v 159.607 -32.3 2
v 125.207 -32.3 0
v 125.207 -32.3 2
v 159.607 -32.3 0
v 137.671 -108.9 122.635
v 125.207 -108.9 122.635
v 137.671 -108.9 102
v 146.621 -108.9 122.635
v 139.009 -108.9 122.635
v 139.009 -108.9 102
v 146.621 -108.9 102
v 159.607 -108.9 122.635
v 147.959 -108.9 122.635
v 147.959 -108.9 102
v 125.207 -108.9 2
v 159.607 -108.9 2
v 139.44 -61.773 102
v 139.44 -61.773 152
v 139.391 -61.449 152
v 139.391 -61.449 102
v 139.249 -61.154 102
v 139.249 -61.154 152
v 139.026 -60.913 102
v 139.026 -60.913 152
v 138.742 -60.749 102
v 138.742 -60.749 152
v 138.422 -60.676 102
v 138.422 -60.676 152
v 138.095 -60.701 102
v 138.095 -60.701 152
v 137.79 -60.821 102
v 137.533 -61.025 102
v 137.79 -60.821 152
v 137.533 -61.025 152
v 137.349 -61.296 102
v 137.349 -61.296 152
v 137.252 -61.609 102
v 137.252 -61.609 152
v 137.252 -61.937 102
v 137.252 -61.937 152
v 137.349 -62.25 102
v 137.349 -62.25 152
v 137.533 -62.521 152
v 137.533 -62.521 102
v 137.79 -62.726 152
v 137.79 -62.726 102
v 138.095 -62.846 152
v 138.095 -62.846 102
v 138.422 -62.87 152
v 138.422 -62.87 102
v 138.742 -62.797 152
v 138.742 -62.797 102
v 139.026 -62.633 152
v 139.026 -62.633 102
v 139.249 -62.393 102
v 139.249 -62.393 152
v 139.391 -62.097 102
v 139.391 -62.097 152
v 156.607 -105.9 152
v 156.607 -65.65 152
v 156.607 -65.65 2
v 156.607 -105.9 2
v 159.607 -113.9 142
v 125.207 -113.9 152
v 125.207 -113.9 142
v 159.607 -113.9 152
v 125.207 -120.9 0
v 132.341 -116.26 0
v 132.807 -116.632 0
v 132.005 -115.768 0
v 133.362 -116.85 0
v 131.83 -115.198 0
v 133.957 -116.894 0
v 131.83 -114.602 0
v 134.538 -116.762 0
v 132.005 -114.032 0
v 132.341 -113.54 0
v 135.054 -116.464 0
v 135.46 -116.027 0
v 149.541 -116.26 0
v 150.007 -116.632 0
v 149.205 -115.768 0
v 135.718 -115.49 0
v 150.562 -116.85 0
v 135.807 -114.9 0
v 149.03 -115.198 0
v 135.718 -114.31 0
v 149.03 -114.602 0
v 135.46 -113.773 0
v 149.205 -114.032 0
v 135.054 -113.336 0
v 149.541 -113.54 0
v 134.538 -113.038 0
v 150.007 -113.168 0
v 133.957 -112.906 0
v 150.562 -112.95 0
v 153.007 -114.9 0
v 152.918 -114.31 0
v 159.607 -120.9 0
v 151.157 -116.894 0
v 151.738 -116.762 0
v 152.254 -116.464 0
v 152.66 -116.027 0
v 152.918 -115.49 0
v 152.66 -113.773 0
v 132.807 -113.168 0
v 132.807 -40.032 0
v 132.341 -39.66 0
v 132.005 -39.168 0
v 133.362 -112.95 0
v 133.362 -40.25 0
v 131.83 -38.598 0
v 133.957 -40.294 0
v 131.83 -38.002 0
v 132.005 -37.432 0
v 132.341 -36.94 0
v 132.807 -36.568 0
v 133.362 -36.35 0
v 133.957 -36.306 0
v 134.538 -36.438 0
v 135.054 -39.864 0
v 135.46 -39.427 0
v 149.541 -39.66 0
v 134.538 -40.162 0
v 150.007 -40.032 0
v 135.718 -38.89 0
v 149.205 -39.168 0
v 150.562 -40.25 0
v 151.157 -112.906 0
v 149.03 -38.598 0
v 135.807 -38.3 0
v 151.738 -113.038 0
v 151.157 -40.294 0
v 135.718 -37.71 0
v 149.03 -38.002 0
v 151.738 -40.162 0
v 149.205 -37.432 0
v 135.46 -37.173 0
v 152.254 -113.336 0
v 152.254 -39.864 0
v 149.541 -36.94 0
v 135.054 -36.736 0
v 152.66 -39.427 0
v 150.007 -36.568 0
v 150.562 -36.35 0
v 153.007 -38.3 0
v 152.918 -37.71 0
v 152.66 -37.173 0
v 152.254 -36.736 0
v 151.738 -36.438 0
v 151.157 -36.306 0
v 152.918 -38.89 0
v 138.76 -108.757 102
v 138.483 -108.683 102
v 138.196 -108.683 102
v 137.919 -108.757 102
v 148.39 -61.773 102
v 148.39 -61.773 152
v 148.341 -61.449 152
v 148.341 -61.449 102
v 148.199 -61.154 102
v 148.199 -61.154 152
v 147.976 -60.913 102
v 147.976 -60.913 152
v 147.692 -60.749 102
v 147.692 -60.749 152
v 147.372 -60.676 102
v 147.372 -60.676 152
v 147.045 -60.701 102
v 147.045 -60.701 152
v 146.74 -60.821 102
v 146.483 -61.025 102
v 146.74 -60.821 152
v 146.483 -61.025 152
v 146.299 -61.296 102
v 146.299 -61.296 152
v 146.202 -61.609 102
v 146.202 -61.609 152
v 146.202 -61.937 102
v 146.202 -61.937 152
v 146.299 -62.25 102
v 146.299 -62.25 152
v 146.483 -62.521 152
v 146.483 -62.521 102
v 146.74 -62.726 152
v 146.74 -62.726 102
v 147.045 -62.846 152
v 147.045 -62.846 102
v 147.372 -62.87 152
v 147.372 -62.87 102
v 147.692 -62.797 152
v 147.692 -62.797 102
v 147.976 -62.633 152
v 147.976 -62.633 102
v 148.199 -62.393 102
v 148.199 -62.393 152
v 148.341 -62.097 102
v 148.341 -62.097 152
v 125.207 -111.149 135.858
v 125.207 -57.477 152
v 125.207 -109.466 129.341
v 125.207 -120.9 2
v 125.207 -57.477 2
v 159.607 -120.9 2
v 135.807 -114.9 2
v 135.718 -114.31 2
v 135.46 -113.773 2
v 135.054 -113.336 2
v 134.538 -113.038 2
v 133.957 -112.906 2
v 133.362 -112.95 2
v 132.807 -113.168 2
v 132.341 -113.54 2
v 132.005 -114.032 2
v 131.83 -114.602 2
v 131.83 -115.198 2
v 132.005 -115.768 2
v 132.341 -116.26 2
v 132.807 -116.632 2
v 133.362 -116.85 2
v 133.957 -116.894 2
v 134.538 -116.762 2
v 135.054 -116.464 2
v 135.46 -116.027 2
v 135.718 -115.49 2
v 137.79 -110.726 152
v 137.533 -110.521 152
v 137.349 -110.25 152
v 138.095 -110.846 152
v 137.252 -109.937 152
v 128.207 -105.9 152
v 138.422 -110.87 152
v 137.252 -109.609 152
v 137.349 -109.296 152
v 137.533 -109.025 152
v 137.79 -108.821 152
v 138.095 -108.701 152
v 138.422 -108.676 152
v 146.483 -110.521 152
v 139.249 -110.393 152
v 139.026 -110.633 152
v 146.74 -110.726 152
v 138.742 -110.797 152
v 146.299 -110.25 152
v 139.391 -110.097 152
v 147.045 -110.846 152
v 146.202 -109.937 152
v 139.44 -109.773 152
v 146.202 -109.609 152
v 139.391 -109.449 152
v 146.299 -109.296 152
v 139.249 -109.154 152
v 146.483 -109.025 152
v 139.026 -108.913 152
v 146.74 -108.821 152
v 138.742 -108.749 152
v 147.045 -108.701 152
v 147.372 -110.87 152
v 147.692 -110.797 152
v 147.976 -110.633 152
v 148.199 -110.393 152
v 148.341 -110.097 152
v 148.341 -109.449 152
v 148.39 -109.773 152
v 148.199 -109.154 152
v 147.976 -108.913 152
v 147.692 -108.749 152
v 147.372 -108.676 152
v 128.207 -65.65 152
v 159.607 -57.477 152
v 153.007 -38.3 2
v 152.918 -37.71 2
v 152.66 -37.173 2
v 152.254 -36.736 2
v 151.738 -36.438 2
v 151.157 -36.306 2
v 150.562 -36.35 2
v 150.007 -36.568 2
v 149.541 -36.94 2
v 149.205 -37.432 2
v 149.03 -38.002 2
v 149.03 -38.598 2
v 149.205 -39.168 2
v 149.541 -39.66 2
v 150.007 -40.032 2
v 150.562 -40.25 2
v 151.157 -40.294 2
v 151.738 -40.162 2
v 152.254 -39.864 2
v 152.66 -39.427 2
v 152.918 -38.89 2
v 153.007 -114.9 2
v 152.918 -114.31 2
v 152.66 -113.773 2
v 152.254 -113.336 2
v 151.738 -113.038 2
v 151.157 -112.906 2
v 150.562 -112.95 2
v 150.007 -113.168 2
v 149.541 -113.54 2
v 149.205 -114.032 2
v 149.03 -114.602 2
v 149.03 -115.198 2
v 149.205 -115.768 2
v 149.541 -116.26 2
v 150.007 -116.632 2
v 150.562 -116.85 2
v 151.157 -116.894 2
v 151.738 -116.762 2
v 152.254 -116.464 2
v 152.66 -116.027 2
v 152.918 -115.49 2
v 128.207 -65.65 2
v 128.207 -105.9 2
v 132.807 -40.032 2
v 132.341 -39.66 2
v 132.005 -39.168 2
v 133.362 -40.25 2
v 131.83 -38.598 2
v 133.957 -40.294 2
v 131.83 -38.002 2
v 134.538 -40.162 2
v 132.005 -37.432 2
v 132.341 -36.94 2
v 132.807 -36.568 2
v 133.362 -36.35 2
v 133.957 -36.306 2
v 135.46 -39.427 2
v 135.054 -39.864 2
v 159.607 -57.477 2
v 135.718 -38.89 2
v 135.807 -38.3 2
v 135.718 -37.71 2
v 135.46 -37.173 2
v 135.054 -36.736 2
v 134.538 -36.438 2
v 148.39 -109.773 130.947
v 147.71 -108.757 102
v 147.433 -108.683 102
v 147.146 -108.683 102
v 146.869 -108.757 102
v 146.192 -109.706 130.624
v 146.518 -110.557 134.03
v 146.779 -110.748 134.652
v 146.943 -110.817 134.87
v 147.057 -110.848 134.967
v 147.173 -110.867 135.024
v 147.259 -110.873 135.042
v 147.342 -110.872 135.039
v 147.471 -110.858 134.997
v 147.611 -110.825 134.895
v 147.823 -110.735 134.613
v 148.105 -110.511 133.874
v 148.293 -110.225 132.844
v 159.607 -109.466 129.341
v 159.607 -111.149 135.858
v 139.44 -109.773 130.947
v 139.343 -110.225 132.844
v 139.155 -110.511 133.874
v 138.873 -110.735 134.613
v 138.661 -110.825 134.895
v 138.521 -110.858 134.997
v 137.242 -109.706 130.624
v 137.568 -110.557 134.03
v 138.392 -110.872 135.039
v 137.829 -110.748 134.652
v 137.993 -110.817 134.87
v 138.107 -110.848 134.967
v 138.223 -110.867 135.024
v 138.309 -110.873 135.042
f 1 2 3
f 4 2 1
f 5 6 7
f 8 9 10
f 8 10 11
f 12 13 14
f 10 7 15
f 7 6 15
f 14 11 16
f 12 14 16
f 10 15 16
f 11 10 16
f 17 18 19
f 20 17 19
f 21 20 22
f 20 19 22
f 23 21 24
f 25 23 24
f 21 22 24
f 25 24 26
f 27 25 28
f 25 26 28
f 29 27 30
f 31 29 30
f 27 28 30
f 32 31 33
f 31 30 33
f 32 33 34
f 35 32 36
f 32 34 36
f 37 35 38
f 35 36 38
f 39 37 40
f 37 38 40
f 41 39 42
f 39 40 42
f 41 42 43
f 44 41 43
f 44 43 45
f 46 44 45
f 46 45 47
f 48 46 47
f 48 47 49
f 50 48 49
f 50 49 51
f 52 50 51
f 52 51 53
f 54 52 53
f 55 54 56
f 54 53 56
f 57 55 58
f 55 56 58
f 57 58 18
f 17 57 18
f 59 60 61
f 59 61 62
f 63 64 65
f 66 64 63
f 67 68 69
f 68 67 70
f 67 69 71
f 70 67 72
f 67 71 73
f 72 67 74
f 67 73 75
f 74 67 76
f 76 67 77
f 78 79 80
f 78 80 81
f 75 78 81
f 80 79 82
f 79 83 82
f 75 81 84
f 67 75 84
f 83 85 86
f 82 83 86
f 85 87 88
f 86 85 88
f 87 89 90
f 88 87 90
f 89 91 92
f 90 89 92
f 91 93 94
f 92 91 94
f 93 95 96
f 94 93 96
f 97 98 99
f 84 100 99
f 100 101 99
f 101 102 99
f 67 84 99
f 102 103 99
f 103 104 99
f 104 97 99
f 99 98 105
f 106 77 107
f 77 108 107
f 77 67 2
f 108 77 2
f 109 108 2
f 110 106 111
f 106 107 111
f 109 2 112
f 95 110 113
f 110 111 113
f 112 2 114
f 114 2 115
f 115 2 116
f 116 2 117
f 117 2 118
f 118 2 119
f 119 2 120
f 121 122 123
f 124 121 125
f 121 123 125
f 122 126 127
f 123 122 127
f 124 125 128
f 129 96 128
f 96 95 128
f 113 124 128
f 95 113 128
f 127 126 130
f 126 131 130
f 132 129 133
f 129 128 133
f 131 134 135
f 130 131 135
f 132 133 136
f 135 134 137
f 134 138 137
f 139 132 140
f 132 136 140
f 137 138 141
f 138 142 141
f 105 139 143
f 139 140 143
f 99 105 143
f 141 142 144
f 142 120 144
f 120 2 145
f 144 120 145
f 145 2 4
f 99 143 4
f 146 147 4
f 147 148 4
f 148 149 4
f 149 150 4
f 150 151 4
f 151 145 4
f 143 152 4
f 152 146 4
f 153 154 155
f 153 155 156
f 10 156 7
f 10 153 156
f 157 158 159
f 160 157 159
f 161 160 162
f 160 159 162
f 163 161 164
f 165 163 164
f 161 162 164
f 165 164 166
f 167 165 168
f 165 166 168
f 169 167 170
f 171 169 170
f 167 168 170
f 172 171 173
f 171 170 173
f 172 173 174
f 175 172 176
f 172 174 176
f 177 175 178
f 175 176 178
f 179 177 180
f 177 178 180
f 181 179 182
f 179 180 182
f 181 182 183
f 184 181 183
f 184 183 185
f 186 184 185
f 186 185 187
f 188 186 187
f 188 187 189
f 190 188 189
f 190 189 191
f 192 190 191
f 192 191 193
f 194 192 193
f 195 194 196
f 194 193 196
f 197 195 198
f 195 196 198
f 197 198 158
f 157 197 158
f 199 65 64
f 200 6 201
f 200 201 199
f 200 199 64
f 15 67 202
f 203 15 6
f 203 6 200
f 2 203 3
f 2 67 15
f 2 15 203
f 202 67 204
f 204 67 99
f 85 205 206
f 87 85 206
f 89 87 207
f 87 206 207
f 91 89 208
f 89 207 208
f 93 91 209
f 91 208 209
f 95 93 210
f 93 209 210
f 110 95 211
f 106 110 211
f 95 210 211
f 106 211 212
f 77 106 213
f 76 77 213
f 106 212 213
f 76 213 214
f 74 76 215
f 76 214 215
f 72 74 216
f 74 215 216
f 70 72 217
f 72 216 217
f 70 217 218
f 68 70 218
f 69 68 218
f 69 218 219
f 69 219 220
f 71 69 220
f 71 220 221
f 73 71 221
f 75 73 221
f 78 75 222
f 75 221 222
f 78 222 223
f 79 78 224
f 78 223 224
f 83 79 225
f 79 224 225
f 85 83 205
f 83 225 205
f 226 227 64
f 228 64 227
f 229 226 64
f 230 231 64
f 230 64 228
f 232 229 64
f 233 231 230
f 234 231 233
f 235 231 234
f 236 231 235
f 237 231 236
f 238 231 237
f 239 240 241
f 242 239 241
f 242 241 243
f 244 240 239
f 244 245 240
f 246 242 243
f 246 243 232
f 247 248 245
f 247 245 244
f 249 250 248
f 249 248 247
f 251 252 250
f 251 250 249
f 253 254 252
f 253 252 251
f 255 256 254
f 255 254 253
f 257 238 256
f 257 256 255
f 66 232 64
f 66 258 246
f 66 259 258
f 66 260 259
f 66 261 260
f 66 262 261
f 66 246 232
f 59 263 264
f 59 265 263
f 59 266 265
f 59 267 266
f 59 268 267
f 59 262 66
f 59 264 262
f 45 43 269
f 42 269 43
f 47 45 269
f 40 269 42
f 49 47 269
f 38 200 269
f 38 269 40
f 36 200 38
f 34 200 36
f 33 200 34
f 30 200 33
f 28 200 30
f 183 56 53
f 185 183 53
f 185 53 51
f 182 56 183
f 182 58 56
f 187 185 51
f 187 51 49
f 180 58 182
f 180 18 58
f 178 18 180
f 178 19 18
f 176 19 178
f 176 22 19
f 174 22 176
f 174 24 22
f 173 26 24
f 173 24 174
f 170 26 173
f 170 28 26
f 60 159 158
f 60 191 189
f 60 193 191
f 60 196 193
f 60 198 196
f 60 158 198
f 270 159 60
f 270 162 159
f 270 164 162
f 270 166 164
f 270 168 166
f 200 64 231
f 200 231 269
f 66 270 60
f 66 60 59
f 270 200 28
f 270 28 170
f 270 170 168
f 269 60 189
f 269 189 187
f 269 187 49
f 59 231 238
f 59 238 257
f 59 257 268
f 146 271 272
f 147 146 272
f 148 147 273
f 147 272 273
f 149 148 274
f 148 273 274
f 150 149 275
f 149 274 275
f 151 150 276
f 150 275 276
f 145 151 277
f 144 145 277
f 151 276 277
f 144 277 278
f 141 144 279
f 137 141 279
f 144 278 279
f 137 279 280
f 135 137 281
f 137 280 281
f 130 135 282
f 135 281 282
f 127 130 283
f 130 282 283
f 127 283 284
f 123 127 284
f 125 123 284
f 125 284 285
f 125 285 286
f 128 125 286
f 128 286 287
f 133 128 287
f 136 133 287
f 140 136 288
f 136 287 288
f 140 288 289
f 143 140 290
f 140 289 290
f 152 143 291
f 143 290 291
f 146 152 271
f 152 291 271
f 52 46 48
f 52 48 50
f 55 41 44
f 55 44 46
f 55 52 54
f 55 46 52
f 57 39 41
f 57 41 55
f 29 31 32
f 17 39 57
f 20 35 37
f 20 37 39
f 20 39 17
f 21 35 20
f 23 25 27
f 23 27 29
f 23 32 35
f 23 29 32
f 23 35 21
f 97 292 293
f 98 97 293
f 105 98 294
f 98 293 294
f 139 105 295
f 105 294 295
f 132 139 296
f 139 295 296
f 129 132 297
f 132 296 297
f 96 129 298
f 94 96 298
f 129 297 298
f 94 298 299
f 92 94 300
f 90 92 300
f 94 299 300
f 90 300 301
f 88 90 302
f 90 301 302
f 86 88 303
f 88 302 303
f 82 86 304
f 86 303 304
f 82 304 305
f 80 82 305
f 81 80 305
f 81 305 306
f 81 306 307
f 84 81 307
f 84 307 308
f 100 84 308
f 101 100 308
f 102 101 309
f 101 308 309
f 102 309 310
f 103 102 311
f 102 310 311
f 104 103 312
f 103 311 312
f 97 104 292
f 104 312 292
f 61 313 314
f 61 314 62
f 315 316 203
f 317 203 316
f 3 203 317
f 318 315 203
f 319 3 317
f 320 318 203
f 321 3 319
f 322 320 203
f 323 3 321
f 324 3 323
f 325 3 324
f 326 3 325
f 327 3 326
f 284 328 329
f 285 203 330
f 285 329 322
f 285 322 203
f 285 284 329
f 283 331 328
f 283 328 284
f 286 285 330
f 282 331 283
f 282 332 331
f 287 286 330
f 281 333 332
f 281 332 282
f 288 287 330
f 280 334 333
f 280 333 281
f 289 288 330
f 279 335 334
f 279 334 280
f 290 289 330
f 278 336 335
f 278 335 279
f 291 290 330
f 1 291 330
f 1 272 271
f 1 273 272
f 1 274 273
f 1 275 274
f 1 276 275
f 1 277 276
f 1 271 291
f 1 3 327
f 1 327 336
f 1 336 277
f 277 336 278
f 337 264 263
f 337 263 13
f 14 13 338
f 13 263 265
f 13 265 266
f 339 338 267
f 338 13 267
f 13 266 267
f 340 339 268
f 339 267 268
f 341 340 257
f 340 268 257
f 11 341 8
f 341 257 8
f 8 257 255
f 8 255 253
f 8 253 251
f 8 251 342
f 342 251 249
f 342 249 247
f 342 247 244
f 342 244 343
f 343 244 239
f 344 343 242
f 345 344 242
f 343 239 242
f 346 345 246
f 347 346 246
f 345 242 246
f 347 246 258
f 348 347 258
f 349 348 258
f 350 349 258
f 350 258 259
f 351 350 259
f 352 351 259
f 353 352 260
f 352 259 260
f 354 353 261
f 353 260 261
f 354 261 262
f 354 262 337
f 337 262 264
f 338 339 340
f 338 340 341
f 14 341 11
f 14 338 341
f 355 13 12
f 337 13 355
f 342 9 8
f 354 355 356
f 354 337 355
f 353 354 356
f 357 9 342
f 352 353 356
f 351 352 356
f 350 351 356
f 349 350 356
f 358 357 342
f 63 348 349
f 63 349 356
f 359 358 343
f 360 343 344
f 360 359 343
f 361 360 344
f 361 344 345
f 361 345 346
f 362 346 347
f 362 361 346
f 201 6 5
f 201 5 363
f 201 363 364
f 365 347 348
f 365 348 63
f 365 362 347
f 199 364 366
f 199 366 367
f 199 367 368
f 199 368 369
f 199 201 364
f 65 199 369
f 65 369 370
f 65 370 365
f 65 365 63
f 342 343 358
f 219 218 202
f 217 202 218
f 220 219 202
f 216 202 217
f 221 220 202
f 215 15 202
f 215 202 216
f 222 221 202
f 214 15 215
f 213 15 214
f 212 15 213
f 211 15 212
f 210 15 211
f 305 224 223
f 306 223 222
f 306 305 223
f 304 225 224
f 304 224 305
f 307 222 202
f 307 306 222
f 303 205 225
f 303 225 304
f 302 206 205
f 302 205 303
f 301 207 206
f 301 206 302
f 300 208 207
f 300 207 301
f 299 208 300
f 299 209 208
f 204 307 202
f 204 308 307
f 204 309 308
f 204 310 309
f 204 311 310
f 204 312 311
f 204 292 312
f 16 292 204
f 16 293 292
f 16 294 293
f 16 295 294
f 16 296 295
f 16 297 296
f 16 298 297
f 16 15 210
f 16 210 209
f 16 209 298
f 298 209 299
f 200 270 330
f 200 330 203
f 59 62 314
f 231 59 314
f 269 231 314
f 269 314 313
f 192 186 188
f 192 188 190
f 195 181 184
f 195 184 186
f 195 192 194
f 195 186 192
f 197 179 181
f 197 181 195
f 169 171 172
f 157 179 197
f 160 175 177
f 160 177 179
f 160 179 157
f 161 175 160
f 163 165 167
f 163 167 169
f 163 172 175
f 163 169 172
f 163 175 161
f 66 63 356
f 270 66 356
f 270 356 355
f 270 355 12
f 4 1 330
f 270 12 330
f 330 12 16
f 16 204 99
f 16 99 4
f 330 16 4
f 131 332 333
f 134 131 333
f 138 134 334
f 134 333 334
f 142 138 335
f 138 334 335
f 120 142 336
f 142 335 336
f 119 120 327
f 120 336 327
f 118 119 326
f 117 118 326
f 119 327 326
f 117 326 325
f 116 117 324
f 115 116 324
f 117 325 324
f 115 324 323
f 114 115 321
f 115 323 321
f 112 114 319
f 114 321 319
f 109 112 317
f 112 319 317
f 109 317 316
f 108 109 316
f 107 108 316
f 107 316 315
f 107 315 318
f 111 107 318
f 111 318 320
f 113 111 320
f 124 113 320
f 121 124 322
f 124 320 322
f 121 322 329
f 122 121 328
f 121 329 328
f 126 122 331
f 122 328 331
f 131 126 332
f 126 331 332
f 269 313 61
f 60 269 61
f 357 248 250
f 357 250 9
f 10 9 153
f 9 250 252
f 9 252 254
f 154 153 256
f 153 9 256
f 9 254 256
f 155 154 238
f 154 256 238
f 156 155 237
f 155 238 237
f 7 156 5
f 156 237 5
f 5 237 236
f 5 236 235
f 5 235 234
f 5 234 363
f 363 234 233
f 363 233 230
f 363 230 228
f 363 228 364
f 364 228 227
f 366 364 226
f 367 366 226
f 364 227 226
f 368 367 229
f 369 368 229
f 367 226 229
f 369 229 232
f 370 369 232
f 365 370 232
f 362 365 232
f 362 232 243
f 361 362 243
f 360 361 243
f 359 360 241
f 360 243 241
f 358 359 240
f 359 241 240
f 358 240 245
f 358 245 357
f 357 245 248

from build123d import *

# Parameters (mm, degrees)
SKETCH2_W           = 34.4
SKETCH2_H           = 88.6
BOSS_EXTRUDE1_DEPTH = 2
SKETCH5_R           = 2
CUT_EXTRUDE1_DEPTH  = 2
SKETCH8_W           = 28.4
SKETCH8_H           = 8.173290792
BOSS_EXTRUDE2_DEPTH = 150
SKETCH11_W          = 34.4
SKETCH11_H          = 5
BOSS_EXTRUDE4_DEPTH = 10
SKETCH12_R          = 1.1
CUT_EXTRUDE2_DEPTH  = 50
FILLET1_R           = 40


with BuildPart() as part:
    # Sketch2 → Boss-Extrude1 (new body)
    with BuildSketch(Plane.XY):
        with Locations((142.4072434, -76.6)):
            Rectangle(SKETCH2_W, SKETCH2_H)
    extrude(amount=BOSS_EXTRUDE1_DEPTH)

    # Sketch5 → Cut-Extrude1 (cut)
    with BuildSketch(Plane.XY.offset(2)):
        with Locations((151.0072434, -114.9)):
            Circle(SKETCH5_R)
        with Locations((133.8072434, -114.9)):
            Circle(SKETCH5_R)
        with Locations((133.8072434, -38.3)):
            Circle(SKETCH5_R)
        with Locations((151.0072434, -38.3)):
            Circle(SKETCH5_R)
    extrude(amount=-CUT_EXTRUDE1_DEPTH, mode=Mode.SUBTRACT)

    # Sketch8 → Boss-Extrude2 (add)
    with BuildSketch(Plane.XY.offset(2)):
        Polygon((125.2072434, -57.477141606), (125.2072434, -108.9), (159.6072434, -108.9), (159.6072434, -57.477141606), (156.6072434, -57.477141606), (156.6072434, -65.650432398), (156.6072434, -105.9), (128.2072434, -105.9), (128.2072434, -65.650432398), (128.2072434, -57.477141606), align=None)
        with Locations((142.4072434, -61.563787002)):
            Rectangle(SKETCH8_W, SKETCH8_H)
    extrude(amount=BOSS_EXTRUDE2_DEPTH)

    # Sketch11 → Boss-Extrude4 (add)
    with BuildSketch(Plane.XY.offset(152)):
        with Locations((142.4072434, -111.4)):
            Rectangle(SKETCH11_W, SKETCH11_H)
    extrude(amount=-BOSS_EXTRUDE4_DEPTH)

    # Sketch12 → Cut-Extrude2 (cut)
    with BuildSketch(Plane.XY.offset(152)):
        with Locations((138.33970051, -61.773162564)):
            Circle(SKETCH12_R)
        with Locations((147.28970051, -61.773162564)):
            Circle(SKETCH12_R)
        with Locations((138.33970051, -109.773162564)):
            Circle(SKETCH12_R)
        with Locations((147.28970051, -109.773162564)):
            Circle(SKETCH12_R)
    extrude(amount=-CUT_EXTRUDE2_DEPTH, mode=Mode.SUBTRACT)

    # Fillet1
    # the kernel refuses this fillet: 40 mm, written as the material it adds along each edge
    with BuildSketch(Plane(origin=(125.2072434, -108.9, 142), x_dir=(0, -1, 0), z_dir=(1, 0, 0))) as fillet1_piece_1_section:
        with BuildLine():
            CenterArc((40, 19.364916731), FILLET1_R, 180, 28.955024372)
            Line((0, 19.364916731), (-0.8, 19.364916731))
            Line((-0.8, 19.364916731), (-0.8, 0))
            Line((-0.8, 0), (0, -0.8))
            ThreePointArc((0, -0.8), (2.5, -0.8), (4.3, -0.387298335))
            Line((4.3, -0.387298335), (5, 0))
        make_face()
    fillet1_piece_1 = extrude(amount=60.875729403, mode=Mode.PRIVATE)
    fillet1_piece_1 = split(fillet1_piece_1, bisect_by=Plane(origin=(159.6072434, -109.845330822, 136.09364372), z_dir=(-1, 0, 0)), keep=Keep.TOP, mode=Mode.PRIVATE)
    fillet1_piece_1 = fillet1_piece_1 - Plane(origin=(147.28970051, -109.773162564, 136.09364372), x_dir=(1, 0, 0), z_dir=(0, 0, 1)) * Cylinder(1.1, 200, mode=Mode.PRIVATE)
    fillet1_piece_1 = fillet1_piece_1 - Plane(origin=(138.33970051, -109.773162564, 136.09364372), x_dir=(1, 0, 0), z_dir=(0, 0, 1)) * Cylinder(1.1, 200, mode=Mode.PRIVATE)
    add(fillet1_piece_1)


solid = part.part
